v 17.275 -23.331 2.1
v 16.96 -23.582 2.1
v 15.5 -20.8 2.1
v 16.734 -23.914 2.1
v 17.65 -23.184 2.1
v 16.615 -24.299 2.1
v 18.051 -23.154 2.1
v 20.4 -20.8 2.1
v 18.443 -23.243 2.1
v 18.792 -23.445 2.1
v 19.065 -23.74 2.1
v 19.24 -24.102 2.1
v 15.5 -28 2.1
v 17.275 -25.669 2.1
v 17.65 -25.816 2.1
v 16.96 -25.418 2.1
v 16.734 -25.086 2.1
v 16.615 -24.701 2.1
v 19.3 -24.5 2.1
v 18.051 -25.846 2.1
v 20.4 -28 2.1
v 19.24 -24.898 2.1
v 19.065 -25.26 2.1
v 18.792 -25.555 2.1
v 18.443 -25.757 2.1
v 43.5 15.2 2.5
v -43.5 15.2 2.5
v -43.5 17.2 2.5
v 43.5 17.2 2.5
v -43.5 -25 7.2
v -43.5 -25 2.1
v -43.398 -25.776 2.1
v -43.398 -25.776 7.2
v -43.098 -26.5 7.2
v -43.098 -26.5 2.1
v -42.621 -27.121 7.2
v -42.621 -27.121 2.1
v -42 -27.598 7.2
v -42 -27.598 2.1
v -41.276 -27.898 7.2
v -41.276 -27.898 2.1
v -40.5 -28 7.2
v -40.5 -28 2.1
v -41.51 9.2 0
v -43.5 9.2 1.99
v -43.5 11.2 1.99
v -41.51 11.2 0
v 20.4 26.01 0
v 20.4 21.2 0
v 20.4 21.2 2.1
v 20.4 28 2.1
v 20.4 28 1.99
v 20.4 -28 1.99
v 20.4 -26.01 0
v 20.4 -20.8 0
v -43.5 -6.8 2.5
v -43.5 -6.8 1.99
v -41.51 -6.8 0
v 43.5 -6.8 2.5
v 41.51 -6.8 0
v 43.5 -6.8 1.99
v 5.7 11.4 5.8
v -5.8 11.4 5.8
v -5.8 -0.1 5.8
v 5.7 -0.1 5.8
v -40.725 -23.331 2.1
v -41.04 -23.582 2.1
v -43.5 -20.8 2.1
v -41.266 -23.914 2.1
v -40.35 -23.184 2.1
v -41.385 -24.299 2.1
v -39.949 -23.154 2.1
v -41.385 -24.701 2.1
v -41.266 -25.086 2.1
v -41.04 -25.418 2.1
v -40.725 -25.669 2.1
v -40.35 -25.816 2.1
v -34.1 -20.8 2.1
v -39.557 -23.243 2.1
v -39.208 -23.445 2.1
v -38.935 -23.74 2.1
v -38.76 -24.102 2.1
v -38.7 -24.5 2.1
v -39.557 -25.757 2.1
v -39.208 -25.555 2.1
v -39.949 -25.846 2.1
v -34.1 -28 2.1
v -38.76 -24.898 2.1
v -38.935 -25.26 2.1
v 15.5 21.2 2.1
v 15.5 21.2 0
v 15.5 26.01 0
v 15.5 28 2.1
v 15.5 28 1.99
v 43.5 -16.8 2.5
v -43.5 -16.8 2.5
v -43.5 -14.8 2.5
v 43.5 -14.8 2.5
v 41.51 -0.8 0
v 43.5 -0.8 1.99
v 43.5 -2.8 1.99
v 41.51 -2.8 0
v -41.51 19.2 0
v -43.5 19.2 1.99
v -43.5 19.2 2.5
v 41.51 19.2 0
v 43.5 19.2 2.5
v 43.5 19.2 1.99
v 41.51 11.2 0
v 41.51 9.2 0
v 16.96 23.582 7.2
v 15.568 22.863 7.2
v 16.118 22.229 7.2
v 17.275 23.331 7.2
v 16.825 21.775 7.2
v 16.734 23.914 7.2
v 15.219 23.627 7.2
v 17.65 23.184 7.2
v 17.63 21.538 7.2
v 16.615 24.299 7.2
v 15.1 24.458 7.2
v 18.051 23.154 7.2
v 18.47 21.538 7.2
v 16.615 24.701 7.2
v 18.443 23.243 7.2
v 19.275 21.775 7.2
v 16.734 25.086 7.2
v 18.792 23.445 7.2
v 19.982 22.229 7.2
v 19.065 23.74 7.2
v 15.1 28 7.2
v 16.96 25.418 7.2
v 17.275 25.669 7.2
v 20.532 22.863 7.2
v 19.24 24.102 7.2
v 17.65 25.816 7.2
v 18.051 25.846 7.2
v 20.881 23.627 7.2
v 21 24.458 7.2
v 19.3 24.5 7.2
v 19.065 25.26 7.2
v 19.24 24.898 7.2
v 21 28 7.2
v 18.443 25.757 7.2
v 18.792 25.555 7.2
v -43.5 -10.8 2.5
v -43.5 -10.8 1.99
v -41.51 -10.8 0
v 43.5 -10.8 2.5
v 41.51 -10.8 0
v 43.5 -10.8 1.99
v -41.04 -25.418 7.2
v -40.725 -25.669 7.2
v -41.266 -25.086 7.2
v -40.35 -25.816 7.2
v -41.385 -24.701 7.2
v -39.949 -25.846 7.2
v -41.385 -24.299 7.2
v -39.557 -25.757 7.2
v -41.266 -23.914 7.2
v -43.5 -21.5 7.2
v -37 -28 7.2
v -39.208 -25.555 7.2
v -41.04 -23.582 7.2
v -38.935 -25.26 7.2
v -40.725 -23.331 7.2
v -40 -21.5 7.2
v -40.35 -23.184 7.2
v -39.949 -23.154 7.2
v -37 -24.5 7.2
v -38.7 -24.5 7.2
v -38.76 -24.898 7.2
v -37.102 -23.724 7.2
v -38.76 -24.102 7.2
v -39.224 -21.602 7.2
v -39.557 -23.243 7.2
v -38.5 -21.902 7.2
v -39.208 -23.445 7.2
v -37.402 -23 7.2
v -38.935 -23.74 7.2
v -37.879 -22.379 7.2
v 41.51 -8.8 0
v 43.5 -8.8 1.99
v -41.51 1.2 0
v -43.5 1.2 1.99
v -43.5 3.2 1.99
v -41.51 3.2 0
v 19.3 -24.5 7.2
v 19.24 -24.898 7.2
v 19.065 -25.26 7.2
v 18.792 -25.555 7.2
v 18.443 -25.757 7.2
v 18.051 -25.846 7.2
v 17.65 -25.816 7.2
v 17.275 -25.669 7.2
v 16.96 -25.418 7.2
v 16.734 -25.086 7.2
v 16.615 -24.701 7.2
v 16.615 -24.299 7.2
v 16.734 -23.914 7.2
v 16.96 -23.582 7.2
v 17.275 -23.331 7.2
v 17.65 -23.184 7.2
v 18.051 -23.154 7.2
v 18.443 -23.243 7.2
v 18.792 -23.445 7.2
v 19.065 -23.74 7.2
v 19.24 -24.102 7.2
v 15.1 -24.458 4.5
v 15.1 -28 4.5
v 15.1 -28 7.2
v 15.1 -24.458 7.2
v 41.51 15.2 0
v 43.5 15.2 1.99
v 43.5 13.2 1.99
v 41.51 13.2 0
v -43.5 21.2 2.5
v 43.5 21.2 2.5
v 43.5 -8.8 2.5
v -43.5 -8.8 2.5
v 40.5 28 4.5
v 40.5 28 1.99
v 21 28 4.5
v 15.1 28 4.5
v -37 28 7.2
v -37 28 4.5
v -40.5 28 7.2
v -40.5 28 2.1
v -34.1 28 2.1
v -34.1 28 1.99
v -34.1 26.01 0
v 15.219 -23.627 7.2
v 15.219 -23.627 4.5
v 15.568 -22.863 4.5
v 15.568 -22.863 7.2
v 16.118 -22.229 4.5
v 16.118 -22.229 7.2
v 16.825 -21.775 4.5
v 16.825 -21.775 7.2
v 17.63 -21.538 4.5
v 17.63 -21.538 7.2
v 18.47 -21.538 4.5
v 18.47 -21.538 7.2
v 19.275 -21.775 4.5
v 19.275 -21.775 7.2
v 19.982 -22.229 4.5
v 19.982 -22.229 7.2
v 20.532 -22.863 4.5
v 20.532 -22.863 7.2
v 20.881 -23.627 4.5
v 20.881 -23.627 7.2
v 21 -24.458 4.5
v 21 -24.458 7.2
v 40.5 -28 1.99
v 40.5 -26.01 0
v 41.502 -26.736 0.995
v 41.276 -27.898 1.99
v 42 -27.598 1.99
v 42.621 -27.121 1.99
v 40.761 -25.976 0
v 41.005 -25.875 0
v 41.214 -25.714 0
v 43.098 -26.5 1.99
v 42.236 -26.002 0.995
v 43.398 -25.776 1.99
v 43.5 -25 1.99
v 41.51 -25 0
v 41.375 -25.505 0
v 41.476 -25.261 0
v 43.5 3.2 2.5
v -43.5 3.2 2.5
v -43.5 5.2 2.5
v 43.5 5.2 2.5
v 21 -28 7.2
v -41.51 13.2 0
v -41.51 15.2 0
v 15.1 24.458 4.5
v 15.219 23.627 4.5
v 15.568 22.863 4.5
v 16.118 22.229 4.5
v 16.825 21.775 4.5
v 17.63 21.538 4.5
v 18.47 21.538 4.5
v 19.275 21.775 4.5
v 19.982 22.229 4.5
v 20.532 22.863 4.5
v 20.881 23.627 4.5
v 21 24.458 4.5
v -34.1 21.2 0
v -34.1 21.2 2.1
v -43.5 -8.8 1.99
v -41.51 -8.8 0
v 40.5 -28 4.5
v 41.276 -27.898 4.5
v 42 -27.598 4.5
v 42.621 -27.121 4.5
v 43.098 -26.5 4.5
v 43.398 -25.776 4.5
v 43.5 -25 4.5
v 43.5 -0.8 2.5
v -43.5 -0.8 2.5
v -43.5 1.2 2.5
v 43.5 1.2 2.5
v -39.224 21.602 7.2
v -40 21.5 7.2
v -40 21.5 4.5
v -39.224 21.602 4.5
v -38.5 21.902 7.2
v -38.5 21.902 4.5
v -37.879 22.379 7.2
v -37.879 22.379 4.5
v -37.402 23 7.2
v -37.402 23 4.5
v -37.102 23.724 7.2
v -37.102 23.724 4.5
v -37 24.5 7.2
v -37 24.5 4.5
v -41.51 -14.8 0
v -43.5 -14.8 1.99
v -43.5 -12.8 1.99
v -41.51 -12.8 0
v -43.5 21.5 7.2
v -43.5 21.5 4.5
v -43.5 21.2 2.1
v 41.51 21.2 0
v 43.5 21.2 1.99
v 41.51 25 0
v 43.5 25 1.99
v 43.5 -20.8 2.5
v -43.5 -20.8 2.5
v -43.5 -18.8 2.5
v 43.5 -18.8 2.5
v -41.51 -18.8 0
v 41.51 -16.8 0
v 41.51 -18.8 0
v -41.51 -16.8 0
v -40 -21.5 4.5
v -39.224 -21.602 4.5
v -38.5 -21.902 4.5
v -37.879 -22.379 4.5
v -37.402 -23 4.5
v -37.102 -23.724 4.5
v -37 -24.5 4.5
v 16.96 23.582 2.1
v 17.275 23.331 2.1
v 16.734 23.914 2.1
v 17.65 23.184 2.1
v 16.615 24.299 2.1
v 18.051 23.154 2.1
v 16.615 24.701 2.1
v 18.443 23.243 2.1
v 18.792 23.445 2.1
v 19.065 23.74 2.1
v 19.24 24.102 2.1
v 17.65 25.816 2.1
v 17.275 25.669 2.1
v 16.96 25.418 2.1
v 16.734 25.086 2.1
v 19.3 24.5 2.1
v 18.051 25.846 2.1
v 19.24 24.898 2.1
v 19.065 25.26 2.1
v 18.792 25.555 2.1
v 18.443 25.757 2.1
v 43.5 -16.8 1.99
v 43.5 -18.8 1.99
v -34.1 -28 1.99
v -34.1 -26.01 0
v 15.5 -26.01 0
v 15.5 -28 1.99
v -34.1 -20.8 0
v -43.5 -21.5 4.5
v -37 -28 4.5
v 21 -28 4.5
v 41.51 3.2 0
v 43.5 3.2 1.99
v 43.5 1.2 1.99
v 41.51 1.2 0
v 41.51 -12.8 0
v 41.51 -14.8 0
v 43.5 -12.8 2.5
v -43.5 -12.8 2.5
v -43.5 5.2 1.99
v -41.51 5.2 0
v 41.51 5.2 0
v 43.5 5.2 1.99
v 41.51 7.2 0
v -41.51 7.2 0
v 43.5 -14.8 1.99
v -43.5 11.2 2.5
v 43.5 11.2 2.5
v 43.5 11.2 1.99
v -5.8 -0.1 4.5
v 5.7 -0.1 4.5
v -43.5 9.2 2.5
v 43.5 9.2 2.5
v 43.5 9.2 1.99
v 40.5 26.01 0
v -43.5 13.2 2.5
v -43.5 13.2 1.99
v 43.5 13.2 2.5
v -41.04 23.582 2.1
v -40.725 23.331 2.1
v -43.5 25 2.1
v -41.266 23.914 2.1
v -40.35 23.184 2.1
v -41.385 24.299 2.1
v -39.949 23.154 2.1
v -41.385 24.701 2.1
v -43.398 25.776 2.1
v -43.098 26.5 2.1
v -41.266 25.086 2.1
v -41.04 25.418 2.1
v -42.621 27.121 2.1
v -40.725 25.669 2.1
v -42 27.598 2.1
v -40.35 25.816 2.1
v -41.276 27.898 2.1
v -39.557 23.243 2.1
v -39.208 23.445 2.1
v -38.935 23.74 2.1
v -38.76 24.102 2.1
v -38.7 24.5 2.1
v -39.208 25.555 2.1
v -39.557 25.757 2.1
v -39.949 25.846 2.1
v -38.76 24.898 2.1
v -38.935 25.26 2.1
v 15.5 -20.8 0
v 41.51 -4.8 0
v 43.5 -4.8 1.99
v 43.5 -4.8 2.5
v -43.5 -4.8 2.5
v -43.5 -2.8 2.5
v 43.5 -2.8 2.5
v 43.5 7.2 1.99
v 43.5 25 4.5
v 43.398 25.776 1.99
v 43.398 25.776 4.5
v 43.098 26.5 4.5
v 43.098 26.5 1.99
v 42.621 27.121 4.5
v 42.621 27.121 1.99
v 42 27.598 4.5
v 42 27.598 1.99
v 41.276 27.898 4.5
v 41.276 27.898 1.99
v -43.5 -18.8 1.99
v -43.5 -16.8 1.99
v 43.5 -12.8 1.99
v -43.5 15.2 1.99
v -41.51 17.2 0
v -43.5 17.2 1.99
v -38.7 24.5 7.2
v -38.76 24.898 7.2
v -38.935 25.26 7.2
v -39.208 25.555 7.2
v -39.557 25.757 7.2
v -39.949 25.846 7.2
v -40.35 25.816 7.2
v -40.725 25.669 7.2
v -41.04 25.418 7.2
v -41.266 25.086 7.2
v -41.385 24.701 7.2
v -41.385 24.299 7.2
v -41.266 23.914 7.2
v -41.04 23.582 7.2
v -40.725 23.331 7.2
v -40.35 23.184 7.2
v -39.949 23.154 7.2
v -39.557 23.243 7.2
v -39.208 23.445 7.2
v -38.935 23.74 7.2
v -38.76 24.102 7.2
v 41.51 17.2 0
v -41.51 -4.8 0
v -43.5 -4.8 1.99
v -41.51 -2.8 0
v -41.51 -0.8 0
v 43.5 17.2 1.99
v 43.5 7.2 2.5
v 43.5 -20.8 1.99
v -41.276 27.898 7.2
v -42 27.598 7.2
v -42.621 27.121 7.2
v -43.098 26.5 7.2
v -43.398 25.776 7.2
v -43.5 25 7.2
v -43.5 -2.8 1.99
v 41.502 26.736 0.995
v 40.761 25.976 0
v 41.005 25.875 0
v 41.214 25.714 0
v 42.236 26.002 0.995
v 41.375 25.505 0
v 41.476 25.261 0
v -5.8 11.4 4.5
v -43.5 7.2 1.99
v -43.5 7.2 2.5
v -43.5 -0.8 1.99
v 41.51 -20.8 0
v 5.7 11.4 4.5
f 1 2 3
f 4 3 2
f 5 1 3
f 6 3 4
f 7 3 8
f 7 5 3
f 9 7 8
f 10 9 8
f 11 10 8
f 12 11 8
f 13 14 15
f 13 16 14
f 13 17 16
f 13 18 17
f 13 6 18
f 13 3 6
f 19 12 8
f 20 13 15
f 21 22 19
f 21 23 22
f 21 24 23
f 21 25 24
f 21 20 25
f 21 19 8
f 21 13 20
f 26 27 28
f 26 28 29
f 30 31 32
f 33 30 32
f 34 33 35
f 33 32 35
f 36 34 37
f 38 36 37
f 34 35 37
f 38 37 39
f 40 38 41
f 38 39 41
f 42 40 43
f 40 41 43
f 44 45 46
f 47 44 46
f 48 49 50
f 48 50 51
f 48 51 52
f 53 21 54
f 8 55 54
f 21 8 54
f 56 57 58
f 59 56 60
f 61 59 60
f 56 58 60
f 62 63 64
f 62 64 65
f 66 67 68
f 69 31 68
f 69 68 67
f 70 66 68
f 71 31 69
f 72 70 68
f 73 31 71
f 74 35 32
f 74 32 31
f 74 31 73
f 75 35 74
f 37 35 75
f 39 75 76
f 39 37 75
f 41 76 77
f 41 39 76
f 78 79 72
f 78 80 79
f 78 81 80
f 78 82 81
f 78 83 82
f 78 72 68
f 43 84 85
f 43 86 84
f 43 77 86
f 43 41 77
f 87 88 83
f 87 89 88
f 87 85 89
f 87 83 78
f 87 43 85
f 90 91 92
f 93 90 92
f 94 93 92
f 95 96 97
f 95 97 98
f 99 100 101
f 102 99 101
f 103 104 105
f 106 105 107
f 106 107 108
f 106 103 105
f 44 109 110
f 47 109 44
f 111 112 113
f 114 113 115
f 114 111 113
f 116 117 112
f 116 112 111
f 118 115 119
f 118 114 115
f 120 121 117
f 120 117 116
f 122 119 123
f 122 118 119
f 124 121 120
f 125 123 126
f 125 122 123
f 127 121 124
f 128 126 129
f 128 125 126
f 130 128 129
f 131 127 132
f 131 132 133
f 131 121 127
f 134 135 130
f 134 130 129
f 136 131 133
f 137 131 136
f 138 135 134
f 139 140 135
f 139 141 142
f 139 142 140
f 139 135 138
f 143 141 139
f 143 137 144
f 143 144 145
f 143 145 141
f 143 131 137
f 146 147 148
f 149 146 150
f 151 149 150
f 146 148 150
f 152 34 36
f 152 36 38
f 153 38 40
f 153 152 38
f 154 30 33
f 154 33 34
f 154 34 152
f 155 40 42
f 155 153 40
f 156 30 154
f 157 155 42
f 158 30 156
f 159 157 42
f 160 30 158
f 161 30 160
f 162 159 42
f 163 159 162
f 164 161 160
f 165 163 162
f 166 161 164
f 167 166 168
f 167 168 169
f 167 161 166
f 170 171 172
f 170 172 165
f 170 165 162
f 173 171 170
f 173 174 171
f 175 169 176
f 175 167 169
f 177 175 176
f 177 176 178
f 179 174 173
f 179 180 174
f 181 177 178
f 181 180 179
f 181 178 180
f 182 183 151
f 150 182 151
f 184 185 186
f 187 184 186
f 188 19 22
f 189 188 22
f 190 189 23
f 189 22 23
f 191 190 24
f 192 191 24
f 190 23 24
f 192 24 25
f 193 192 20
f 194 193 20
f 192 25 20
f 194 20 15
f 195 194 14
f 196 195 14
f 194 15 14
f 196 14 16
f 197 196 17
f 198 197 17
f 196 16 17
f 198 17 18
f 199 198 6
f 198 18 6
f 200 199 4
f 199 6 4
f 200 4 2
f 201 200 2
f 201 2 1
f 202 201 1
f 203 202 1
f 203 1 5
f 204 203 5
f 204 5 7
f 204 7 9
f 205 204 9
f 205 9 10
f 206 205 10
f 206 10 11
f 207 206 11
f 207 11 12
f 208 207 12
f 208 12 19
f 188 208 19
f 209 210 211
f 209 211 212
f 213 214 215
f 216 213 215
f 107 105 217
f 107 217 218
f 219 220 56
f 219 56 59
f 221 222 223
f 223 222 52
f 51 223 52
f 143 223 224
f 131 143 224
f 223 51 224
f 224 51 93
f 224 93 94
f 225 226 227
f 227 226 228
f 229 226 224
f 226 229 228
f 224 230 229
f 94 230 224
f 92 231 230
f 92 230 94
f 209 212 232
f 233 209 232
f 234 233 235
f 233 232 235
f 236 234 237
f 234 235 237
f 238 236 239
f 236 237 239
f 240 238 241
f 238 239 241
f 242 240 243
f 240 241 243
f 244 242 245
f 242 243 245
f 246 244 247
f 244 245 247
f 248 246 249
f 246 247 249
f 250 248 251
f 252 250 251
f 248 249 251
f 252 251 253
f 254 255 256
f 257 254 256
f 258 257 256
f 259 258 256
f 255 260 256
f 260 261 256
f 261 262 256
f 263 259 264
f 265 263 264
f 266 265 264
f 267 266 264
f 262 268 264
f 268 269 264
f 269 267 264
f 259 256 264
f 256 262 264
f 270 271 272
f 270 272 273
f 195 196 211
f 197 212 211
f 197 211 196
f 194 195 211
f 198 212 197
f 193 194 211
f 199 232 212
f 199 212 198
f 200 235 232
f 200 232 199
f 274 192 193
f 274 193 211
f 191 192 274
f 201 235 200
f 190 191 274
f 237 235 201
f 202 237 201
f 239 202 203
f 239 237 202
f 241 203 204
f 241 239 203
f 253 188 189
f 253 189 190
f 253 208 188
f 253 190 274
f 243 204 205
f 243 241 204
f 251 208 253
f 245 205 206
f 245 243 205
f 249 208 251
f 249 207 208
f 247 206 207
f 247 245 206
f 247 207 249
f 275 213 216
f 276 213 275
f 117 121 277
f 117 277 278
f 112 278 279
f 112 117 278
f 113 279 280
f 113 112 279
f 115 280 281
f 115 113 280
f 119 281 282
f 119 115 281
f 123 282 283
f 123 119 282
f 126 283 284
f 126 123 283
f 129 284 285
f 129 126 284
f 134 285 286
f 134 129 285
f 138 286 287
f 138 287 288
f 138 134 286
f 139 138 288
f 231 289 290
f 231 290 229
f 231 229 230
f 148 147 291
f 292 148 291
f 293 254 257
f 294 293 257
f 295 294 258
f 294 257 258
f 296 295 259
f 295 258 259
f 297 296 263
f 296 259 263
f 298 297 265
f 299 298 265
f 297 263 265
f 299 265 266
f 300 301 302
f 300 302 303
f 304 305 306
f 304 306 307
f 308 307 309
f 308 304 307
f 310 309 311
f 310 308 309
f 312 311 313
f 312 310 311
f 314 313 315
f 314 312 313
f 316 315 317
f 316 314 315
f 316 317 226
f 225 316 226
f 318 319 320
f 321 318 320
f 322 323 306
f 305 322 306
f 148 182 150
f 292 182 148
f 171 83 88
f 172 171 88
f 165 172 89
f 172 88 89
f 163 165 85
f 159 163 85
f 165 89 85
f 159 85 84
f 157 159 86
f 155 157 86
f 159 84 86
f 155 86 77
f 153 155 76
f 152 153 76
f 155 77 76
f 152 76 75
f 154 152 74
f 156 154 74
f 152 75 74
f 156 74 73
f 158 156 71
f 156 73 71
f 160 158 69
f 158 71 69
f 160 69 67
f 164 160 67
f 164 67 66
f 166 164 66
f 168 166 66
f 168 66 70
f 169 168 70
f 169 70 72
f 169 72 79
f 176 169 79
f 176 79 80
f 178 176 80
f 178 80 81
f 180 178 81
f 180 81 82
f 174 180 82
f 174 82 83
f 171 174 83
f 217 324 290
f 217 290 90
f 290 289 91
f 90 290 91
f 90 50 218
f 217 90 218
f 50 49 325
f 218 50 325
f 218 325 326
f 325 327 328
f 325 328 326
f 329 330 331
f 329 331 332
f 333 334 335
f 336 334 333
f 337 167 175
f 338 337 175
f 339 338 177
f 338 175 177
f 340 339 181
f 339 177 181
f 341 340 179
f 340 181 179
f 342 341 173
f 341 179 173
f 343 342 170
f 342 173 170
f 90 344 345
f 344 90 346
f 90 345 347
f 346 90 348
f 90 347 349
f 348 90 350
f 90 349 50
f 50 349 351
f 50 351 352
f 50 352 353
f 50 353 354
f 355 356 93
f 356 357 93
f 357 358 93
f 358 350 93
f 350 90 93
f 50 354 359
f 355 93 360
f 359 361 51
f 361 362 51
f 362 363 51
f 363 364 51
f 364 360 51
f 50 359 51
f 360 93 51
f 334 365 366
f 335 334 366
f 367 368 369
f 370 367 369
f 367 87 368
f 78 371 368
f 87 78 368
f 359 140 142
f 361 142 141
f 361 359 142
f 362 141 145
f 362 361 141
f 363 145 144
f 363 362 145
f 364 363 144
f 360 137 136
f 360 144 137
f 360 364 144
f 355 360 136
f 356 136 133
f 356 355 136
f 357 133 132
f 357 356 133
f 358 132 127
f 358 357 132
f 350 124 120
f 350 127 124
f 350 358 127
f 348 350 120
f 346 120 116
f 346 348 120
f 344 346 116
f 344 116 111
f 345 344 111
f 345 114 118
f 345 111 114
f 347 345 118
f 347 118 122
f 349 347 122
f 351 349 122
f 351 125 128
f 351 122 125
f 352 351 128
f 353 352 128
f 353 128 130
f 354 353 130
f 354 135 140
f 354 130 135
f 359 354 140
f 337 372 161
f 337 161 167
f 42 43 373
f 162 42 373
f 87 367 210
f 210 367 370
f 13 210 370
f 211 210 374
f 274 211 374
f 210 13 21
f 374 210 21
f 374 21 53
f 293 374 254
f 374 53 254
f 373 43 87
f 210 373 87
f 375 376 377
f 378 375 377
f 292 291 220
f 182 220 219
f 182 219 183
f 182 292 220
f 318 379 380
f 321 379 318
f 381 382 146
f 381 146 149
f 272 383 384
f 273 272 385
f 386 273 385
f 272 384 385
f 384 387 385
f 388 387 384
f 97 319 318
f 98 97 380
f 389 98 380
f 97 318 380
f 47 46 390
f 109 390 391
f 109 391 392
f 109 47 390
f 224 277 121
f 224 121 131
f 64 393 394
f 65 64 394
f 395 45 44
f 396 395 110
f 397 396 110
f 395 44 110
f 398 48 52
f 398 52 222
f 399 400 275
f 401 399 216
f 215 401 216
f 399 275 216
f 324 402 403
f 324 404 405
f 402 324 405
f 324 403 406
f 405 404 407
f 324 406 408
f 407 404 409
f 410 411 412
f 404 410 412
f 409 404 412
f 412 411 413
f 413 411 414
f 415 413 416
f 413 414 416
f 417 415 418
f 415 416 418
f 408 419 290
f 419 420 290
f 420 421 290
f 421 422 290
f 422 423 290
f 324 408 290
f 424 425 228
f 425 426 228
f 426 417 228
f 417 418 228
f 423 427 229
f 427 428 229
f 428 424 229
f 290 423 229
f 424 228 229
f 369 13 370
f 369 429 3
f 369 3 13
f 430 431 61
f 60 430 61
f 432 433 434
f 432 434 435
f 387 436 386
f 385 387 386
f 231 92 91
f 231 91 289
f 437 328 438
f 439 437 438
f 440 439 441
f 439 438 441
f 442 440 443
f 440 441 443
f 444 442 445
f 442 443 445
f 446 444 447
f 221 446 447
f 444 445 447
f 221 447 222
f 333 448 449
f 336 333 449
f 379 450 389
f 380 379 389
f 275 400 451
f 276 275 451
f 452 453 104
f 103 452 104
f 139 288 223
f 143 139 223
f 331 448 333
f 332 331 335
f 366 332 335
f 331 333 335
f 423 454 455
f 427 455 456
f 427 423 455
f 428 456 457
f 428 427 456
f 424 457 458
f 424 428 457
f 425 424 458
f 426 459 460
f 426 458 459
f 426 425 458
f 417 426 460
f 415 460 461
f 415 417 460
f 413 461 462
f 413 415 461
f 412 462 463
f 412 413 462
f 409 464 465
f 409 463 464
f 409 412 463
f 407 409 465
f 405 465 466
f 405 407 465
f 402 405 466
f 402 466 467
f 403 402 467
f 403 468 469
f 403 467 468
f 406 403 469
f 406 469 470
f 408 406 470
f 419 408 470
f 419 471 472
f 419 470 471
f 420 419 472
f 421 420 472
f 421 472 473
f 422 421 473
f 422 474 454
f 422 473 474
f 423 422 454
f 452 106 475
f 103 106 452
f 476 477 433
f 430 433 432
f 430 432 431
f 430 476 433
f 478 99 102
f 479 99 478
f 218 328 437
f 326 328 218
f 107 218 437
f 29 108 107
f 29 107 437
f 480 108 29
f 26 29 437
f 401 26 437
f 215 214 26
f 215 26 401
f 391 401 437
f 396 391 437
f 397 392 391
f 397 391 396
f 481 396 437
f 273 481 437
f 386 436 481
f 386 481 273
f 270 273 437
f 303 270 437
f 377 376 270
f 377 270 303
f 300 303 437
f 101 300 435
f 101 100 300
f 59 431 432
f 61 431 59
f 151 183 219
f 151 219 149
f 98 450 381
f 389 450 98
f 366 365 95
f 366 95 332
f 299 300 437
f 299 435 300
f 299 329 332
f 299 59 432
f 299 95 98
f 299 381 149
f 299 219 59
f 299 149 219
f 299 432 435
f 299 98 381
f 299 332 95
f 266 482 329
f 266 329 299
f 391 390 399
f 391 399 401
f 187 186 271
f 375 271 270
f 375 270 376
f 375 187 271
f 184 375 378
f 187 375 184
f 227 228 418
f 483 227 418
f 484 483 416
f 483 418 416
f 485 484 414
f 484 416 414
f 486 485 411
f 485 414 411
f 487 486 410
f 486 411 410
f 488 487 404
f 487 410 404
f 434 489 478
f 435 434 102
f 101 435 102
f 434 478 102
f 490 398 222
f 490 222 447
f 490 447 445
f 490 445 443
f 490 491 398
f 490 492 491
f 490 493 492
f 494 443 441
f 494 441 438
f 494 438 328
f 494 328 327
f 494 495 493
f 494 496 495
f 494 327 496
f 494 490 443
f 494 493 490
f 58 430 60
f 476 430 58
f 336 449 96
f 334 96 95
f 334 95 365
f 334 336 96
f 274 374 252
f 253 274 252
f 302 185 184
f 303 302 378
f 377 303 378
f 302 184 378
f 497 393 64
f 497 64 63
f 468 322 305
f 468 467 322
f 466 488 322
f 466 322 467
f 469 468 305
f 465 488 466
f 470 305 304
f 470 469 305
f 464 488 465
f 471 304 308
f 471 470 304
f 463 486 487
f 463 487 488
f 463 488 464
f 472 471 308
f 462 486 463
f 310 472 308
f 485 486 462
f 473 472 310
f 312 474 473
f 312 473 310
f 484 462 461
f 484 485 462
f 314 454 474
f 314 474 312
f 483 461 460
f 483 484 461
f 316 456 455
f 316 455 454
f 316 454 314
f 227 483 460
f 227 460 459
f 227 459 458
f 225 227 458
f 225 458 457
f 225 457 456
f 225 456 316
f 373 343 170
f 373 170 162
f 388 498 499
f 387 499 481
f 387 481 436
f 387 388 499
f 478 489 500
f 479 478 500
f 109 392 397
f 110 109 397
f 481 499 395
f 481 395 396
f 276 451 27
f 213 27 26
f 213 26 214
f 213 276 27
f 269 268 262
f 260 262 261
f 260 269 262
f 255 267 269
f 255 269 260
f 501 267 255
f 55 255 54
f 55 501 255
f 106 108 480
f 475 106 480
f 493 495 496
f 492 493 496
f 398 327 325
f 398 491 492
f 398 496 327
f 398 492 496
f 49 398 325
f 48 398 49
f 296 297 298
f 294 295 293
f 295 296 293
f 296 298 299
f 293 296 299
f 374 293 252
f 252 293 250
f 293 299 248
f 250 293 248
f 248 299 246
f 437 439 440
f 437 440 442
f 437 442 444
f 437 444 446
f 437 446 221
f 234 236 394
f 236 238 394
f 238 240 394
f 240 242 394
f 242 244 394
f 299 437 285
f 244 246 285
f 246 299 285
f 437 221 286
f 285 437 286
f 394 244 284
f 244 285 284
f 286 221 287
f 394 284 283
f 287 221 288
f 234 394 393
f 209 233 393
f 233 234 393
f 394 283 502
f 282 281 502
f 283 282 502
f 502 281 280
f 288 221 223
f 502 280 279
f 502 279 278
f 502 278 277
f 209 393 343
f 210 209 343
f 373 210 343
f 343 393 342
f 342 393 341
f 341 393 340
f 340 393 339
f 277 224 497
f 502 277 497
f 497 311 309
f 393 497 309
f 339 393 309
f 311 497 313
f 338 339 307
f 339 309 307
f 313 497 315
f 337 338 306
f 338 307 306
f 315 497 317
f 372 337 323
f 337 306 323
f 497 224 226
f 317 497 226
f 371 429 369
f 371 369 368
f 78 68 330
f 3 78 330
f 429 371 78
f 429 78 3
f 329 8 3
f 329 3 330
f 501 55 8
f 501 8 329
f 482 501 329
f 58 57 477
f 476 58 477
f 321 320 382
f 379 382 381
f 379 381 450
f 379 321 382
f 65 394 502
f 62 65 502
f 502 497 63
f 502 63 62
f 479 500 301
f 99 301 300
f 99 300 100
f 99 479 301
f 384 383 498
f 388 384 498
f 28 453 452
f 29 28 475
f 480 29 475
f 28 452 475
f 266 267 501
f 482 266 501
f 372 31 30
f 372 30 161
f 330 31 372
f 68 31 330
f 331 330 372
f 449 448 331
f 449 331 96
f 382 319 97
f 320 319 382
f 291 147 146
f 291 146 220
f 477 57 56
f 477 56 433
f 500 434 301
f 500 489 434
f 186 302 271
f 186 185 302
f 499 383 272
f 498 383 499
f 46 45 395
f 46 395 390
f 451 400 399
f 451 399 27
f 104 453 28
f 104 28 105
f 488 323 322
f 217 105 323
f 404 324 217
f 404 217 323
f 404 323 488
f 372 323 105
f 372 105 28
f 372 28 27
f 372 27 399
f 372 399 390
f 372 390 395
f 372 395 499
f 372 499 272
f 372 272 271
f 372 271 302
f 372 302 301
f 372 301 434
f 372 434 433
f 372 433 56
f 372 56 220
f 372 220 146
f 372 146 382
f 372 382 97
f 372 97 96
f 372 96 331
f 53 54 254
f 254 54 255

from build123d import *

# Parameters (mm, degrees)
PAD_DEPTH           = 4.5
SKETCH001_W         = 5.9
SKETCH001_H         = 6.5
PAD001_DEPTH        = 2.7
SKETCH002_W         = 87
SKETCH002_H         = 2
POCKET_DEPTH        = 2.5
LINEARPATTERN_COUNT = 11
LINEARPATTERN_PITCH = 4
SKETCH003_W         = 4.9
SKETCH003_H         = 7.2
POCKET001_DEPTH     = 2.1
SKETCH004_R         = 1.35
POCKET002_DEPTH     = 212.531374
CHAMFER_SIZE        = 1.99
POCKET003_DEPTH     = 2.7
SKETCH006_W         = 11.5
SKETCH006_H         = 11.5
PAD002_DEPTH        = 1.3


with BuildPart() as part:
    # Sketch → Pad (new body)
    with BuildSketch(Plane.XY):
        with BuildLine():
            Line((43.5, 25), (43.5, -25))
            ThreePointArc((40.5, -28), (42.62132, -27.12132), (43.5, -25))
            Line((-40.5, -28), (40.5, -28))
            ThreePointArc((-43.5, -25), (-42.62132, -27.12132), (-40.5, -28))
            Line((-43.5, -25), (-43.5, 25))
            ThreePointArc((-40.5, 28), (-42.62132, 27.12132), (-43.5, 25))
            Line((-40.5, 28), (40.5, 28))
            ThreePointArc((43.5, 25), (42.62132, 27.12132), (40.5, 28))
        make_face()
    extrude(amount=PAD_DEPTH)

    # Sketch001 (on Face10 of Pad) → Pad001 (join)
    with BuildSketch(Plane.XY.offset(4.5)):
        with BuildLine():
            Line((-43.5, 21.5), (-37, 21.5))
            Line((-37, 21.5), (-37, 28))
            Line((-37, 28), (-40.5, 28))
            ThreePointArc((-40.5, 28), (-42.62132, 27.12132), (-43.5, 25))
            Line((-43.5, 21.5), (-43.5, 25))
        make_face()
        with Locations((18.05, 24.75)):
            Rectangle(SKETCH001_W, SKETCH001_H)
        with BuildLine():
            Line((-43.5, -21.5), (-43.5, -25))
            ThreePointArc((-43.5, -25), (-42.62132, -27.12132), (-40.5, -28))
            Line((-40.5, -28), (-37, -28))
            Line((-37, -21.5), (-37, -28))
            Line((-43.5, -21.5), (-37, -21.5))
        make_face()
        with Locations((18.05, -24.75)):
            Rectangle(SKETCH001_W, SKETCH001_H)
    extrude(amount=PAD001_DEPTH)

    # Sketch002 (on Face4 of Pad001) → Pocket (cut)
    with BuildSketch(Plane(origin=(0, 0, 0), x_dir=(1, 0, 0), z_dir=(0, 0, -1))):
        with Locations((0, 19.8)):
            Rectangle(SKETCH002_W, SKETCH002_H)
    pocket = extrude(amount=-POCKET_DEPTH, mode=Mode.SUBTRACT)

    # LinearPattern: Pocket ×11
    with Locations(*[(0, i * LINEARPATTERN_PITCH, 0) for i in range(1, LINEARPATTERN_COUNT)]):
        add(pocket, mode=Mode.SUBTRACT)

    # Sketch003 (on Face26 of LinearPattern) → Pocket001 (cut)
    with BuildSketch(Plane(origin=(0, 0, 0), x_dir=(1, 0, 0), z_dir=(0, 0, -1))):
        with BuildLine():
            Line((-43.5, 25), (-43.5, 20.8))
            Line((-43.5, 20.8), (-34.1, 20.8))
            Line((-34.1, 20.8), (-34.1, 28))
            Line((-40.5, 28), (-34.1, 28))
            ThreePointArc((-40.5, 28), (-42.62132, 27.12132), (-43.5, 25))
        make_face()
        with Locations((17.95, 24.4)):
            Rectangle(SKETCH003_W, SKETCH003_H)
    pocket001 = extrude(amount=-POCKET001_DEPTH, mode=Mode.SUBTRACT)

    # Mirrored: Pocket001 across Sketch003 H_Axis
    add(pocket001.mirror(Plane(origin=(0, 0, 0), x_dir=(0, 0, -1), z_dir=(0, -1, 0))), mode=Mode.SUBTRACT)

    # Sketch004 (on Face33 of Mirrored) → Pocket002 (cut, through all)
    with BuildSketch(Plane(origin=(0, 0, 2.1), x_dir=(1, 0, 0), z_dir=(0, 0, -1))):
        with Locations((-40.05, 24.5)):
            Circle(SKETCH004_R)
        with Locations((17.95, 24.5)):
            Circle(SKETCH004_R)
    pocket002 = extrude(amount=-POCKET002_DEPTH, mode=Mode.SUBTRACT)

    # Mirrored001: Pocket002 across Sketch004 H_Axis
    add(pocket002.mirror(Plane(origin=(0, 0, 2.1), x_dir=(0, 0, -1), z_dir=(0, -1, 0))), mode=Mode.SUBTRACT)

    # Chamfer
    chamfer_edges = [part.edges().sort_by_distance(p)[0] for p in [
        (-9.3, 28, 0),
        (-43.5, 18.2, 0),
        (-43.5, 14.2, 0),
        (-43.5, 10.2, 0),
        (-43.5, 6.2, 0),
        (-43.5, 2.2, 0),
        (-43.5, -1.8, 0),
        (-43.5, -5.8, 0),
        (-43.5, -9.8, 0),
        (-43.5, -13.8, 0),
        (-43.5, -17.8, 0),
        (-9.3, -28, 0),
        (30.45, -28, 0),
        (42.62132, -27.12132, 0),
        (43.5, -22.9, 0),
        (43.5, -17.8, 0),
        (43.5, -13.8, 0),
        (43.5, -9.8, 0),
        (43.5, -5.8, 0),
        (43.5, -1.8, 0),
        (43.5, 2.2, 0),
        (43.5, 6.2, 0),
        (43.5, 10.2, 0),
        (43.5, 14.2, 0),
        (43.5, 18.2, 0),
        (43.5, 23.1, 0),
        (42.62132, 27.12132, 0),
        (30.45, 28, 0),
    ]]
    chamfer(chamfer_edges, length=CHAMFER_SIZE)

    # Sketch005 (on Face21 of Chamfer) → Pocket003 (cut)
    with BuildSketch(Plane.XY.offset(7.2)):
        with BuildLine():
            Line((-40, 21.5), (-37, 21.5))
            Line((-37, 24.5), (-37, 21.5))
            ThreePointArc((-40, 21.5), (-37.87868, 22.37868), (-37, 24.5))
        make_face()
        with BuildLine():
            Line((15.1, 21.5), (21, 21.5))
            Line((21, 24.458305), (21, 21.5))
            ThreePointArc((15.1, 24.458305), (18.05, 21.508305), (21, 24.458305))
            Line((15.1, 21.5), (15.1, 24.458305))
        make_face()
    pocket003 = extrude(amount=-POCKET003_DEPTH, mode=Mode.SUBTRACT)

    # Mirrored002: Pocket003 across Sketch005 H_Axis
    add(pocket003.mirror(Plane(origin=(0, 0, 7.2), x_dir=(0, 0, 1), z_dir=(0, 1, 0))), mode=Mode.SUBTRACT)

    # Sketch006 (on Face110 of Mirrored002) → Pad002 (join)
    with BuildSketch(Plane.XY.offset(4.5)):
        with Locations((-0.05, 5.65)):
            Rectangle(SKETCH006_W, SKETCH006_H)
    extrude(amount=PAD002_DEPTH)


solid = part.part
